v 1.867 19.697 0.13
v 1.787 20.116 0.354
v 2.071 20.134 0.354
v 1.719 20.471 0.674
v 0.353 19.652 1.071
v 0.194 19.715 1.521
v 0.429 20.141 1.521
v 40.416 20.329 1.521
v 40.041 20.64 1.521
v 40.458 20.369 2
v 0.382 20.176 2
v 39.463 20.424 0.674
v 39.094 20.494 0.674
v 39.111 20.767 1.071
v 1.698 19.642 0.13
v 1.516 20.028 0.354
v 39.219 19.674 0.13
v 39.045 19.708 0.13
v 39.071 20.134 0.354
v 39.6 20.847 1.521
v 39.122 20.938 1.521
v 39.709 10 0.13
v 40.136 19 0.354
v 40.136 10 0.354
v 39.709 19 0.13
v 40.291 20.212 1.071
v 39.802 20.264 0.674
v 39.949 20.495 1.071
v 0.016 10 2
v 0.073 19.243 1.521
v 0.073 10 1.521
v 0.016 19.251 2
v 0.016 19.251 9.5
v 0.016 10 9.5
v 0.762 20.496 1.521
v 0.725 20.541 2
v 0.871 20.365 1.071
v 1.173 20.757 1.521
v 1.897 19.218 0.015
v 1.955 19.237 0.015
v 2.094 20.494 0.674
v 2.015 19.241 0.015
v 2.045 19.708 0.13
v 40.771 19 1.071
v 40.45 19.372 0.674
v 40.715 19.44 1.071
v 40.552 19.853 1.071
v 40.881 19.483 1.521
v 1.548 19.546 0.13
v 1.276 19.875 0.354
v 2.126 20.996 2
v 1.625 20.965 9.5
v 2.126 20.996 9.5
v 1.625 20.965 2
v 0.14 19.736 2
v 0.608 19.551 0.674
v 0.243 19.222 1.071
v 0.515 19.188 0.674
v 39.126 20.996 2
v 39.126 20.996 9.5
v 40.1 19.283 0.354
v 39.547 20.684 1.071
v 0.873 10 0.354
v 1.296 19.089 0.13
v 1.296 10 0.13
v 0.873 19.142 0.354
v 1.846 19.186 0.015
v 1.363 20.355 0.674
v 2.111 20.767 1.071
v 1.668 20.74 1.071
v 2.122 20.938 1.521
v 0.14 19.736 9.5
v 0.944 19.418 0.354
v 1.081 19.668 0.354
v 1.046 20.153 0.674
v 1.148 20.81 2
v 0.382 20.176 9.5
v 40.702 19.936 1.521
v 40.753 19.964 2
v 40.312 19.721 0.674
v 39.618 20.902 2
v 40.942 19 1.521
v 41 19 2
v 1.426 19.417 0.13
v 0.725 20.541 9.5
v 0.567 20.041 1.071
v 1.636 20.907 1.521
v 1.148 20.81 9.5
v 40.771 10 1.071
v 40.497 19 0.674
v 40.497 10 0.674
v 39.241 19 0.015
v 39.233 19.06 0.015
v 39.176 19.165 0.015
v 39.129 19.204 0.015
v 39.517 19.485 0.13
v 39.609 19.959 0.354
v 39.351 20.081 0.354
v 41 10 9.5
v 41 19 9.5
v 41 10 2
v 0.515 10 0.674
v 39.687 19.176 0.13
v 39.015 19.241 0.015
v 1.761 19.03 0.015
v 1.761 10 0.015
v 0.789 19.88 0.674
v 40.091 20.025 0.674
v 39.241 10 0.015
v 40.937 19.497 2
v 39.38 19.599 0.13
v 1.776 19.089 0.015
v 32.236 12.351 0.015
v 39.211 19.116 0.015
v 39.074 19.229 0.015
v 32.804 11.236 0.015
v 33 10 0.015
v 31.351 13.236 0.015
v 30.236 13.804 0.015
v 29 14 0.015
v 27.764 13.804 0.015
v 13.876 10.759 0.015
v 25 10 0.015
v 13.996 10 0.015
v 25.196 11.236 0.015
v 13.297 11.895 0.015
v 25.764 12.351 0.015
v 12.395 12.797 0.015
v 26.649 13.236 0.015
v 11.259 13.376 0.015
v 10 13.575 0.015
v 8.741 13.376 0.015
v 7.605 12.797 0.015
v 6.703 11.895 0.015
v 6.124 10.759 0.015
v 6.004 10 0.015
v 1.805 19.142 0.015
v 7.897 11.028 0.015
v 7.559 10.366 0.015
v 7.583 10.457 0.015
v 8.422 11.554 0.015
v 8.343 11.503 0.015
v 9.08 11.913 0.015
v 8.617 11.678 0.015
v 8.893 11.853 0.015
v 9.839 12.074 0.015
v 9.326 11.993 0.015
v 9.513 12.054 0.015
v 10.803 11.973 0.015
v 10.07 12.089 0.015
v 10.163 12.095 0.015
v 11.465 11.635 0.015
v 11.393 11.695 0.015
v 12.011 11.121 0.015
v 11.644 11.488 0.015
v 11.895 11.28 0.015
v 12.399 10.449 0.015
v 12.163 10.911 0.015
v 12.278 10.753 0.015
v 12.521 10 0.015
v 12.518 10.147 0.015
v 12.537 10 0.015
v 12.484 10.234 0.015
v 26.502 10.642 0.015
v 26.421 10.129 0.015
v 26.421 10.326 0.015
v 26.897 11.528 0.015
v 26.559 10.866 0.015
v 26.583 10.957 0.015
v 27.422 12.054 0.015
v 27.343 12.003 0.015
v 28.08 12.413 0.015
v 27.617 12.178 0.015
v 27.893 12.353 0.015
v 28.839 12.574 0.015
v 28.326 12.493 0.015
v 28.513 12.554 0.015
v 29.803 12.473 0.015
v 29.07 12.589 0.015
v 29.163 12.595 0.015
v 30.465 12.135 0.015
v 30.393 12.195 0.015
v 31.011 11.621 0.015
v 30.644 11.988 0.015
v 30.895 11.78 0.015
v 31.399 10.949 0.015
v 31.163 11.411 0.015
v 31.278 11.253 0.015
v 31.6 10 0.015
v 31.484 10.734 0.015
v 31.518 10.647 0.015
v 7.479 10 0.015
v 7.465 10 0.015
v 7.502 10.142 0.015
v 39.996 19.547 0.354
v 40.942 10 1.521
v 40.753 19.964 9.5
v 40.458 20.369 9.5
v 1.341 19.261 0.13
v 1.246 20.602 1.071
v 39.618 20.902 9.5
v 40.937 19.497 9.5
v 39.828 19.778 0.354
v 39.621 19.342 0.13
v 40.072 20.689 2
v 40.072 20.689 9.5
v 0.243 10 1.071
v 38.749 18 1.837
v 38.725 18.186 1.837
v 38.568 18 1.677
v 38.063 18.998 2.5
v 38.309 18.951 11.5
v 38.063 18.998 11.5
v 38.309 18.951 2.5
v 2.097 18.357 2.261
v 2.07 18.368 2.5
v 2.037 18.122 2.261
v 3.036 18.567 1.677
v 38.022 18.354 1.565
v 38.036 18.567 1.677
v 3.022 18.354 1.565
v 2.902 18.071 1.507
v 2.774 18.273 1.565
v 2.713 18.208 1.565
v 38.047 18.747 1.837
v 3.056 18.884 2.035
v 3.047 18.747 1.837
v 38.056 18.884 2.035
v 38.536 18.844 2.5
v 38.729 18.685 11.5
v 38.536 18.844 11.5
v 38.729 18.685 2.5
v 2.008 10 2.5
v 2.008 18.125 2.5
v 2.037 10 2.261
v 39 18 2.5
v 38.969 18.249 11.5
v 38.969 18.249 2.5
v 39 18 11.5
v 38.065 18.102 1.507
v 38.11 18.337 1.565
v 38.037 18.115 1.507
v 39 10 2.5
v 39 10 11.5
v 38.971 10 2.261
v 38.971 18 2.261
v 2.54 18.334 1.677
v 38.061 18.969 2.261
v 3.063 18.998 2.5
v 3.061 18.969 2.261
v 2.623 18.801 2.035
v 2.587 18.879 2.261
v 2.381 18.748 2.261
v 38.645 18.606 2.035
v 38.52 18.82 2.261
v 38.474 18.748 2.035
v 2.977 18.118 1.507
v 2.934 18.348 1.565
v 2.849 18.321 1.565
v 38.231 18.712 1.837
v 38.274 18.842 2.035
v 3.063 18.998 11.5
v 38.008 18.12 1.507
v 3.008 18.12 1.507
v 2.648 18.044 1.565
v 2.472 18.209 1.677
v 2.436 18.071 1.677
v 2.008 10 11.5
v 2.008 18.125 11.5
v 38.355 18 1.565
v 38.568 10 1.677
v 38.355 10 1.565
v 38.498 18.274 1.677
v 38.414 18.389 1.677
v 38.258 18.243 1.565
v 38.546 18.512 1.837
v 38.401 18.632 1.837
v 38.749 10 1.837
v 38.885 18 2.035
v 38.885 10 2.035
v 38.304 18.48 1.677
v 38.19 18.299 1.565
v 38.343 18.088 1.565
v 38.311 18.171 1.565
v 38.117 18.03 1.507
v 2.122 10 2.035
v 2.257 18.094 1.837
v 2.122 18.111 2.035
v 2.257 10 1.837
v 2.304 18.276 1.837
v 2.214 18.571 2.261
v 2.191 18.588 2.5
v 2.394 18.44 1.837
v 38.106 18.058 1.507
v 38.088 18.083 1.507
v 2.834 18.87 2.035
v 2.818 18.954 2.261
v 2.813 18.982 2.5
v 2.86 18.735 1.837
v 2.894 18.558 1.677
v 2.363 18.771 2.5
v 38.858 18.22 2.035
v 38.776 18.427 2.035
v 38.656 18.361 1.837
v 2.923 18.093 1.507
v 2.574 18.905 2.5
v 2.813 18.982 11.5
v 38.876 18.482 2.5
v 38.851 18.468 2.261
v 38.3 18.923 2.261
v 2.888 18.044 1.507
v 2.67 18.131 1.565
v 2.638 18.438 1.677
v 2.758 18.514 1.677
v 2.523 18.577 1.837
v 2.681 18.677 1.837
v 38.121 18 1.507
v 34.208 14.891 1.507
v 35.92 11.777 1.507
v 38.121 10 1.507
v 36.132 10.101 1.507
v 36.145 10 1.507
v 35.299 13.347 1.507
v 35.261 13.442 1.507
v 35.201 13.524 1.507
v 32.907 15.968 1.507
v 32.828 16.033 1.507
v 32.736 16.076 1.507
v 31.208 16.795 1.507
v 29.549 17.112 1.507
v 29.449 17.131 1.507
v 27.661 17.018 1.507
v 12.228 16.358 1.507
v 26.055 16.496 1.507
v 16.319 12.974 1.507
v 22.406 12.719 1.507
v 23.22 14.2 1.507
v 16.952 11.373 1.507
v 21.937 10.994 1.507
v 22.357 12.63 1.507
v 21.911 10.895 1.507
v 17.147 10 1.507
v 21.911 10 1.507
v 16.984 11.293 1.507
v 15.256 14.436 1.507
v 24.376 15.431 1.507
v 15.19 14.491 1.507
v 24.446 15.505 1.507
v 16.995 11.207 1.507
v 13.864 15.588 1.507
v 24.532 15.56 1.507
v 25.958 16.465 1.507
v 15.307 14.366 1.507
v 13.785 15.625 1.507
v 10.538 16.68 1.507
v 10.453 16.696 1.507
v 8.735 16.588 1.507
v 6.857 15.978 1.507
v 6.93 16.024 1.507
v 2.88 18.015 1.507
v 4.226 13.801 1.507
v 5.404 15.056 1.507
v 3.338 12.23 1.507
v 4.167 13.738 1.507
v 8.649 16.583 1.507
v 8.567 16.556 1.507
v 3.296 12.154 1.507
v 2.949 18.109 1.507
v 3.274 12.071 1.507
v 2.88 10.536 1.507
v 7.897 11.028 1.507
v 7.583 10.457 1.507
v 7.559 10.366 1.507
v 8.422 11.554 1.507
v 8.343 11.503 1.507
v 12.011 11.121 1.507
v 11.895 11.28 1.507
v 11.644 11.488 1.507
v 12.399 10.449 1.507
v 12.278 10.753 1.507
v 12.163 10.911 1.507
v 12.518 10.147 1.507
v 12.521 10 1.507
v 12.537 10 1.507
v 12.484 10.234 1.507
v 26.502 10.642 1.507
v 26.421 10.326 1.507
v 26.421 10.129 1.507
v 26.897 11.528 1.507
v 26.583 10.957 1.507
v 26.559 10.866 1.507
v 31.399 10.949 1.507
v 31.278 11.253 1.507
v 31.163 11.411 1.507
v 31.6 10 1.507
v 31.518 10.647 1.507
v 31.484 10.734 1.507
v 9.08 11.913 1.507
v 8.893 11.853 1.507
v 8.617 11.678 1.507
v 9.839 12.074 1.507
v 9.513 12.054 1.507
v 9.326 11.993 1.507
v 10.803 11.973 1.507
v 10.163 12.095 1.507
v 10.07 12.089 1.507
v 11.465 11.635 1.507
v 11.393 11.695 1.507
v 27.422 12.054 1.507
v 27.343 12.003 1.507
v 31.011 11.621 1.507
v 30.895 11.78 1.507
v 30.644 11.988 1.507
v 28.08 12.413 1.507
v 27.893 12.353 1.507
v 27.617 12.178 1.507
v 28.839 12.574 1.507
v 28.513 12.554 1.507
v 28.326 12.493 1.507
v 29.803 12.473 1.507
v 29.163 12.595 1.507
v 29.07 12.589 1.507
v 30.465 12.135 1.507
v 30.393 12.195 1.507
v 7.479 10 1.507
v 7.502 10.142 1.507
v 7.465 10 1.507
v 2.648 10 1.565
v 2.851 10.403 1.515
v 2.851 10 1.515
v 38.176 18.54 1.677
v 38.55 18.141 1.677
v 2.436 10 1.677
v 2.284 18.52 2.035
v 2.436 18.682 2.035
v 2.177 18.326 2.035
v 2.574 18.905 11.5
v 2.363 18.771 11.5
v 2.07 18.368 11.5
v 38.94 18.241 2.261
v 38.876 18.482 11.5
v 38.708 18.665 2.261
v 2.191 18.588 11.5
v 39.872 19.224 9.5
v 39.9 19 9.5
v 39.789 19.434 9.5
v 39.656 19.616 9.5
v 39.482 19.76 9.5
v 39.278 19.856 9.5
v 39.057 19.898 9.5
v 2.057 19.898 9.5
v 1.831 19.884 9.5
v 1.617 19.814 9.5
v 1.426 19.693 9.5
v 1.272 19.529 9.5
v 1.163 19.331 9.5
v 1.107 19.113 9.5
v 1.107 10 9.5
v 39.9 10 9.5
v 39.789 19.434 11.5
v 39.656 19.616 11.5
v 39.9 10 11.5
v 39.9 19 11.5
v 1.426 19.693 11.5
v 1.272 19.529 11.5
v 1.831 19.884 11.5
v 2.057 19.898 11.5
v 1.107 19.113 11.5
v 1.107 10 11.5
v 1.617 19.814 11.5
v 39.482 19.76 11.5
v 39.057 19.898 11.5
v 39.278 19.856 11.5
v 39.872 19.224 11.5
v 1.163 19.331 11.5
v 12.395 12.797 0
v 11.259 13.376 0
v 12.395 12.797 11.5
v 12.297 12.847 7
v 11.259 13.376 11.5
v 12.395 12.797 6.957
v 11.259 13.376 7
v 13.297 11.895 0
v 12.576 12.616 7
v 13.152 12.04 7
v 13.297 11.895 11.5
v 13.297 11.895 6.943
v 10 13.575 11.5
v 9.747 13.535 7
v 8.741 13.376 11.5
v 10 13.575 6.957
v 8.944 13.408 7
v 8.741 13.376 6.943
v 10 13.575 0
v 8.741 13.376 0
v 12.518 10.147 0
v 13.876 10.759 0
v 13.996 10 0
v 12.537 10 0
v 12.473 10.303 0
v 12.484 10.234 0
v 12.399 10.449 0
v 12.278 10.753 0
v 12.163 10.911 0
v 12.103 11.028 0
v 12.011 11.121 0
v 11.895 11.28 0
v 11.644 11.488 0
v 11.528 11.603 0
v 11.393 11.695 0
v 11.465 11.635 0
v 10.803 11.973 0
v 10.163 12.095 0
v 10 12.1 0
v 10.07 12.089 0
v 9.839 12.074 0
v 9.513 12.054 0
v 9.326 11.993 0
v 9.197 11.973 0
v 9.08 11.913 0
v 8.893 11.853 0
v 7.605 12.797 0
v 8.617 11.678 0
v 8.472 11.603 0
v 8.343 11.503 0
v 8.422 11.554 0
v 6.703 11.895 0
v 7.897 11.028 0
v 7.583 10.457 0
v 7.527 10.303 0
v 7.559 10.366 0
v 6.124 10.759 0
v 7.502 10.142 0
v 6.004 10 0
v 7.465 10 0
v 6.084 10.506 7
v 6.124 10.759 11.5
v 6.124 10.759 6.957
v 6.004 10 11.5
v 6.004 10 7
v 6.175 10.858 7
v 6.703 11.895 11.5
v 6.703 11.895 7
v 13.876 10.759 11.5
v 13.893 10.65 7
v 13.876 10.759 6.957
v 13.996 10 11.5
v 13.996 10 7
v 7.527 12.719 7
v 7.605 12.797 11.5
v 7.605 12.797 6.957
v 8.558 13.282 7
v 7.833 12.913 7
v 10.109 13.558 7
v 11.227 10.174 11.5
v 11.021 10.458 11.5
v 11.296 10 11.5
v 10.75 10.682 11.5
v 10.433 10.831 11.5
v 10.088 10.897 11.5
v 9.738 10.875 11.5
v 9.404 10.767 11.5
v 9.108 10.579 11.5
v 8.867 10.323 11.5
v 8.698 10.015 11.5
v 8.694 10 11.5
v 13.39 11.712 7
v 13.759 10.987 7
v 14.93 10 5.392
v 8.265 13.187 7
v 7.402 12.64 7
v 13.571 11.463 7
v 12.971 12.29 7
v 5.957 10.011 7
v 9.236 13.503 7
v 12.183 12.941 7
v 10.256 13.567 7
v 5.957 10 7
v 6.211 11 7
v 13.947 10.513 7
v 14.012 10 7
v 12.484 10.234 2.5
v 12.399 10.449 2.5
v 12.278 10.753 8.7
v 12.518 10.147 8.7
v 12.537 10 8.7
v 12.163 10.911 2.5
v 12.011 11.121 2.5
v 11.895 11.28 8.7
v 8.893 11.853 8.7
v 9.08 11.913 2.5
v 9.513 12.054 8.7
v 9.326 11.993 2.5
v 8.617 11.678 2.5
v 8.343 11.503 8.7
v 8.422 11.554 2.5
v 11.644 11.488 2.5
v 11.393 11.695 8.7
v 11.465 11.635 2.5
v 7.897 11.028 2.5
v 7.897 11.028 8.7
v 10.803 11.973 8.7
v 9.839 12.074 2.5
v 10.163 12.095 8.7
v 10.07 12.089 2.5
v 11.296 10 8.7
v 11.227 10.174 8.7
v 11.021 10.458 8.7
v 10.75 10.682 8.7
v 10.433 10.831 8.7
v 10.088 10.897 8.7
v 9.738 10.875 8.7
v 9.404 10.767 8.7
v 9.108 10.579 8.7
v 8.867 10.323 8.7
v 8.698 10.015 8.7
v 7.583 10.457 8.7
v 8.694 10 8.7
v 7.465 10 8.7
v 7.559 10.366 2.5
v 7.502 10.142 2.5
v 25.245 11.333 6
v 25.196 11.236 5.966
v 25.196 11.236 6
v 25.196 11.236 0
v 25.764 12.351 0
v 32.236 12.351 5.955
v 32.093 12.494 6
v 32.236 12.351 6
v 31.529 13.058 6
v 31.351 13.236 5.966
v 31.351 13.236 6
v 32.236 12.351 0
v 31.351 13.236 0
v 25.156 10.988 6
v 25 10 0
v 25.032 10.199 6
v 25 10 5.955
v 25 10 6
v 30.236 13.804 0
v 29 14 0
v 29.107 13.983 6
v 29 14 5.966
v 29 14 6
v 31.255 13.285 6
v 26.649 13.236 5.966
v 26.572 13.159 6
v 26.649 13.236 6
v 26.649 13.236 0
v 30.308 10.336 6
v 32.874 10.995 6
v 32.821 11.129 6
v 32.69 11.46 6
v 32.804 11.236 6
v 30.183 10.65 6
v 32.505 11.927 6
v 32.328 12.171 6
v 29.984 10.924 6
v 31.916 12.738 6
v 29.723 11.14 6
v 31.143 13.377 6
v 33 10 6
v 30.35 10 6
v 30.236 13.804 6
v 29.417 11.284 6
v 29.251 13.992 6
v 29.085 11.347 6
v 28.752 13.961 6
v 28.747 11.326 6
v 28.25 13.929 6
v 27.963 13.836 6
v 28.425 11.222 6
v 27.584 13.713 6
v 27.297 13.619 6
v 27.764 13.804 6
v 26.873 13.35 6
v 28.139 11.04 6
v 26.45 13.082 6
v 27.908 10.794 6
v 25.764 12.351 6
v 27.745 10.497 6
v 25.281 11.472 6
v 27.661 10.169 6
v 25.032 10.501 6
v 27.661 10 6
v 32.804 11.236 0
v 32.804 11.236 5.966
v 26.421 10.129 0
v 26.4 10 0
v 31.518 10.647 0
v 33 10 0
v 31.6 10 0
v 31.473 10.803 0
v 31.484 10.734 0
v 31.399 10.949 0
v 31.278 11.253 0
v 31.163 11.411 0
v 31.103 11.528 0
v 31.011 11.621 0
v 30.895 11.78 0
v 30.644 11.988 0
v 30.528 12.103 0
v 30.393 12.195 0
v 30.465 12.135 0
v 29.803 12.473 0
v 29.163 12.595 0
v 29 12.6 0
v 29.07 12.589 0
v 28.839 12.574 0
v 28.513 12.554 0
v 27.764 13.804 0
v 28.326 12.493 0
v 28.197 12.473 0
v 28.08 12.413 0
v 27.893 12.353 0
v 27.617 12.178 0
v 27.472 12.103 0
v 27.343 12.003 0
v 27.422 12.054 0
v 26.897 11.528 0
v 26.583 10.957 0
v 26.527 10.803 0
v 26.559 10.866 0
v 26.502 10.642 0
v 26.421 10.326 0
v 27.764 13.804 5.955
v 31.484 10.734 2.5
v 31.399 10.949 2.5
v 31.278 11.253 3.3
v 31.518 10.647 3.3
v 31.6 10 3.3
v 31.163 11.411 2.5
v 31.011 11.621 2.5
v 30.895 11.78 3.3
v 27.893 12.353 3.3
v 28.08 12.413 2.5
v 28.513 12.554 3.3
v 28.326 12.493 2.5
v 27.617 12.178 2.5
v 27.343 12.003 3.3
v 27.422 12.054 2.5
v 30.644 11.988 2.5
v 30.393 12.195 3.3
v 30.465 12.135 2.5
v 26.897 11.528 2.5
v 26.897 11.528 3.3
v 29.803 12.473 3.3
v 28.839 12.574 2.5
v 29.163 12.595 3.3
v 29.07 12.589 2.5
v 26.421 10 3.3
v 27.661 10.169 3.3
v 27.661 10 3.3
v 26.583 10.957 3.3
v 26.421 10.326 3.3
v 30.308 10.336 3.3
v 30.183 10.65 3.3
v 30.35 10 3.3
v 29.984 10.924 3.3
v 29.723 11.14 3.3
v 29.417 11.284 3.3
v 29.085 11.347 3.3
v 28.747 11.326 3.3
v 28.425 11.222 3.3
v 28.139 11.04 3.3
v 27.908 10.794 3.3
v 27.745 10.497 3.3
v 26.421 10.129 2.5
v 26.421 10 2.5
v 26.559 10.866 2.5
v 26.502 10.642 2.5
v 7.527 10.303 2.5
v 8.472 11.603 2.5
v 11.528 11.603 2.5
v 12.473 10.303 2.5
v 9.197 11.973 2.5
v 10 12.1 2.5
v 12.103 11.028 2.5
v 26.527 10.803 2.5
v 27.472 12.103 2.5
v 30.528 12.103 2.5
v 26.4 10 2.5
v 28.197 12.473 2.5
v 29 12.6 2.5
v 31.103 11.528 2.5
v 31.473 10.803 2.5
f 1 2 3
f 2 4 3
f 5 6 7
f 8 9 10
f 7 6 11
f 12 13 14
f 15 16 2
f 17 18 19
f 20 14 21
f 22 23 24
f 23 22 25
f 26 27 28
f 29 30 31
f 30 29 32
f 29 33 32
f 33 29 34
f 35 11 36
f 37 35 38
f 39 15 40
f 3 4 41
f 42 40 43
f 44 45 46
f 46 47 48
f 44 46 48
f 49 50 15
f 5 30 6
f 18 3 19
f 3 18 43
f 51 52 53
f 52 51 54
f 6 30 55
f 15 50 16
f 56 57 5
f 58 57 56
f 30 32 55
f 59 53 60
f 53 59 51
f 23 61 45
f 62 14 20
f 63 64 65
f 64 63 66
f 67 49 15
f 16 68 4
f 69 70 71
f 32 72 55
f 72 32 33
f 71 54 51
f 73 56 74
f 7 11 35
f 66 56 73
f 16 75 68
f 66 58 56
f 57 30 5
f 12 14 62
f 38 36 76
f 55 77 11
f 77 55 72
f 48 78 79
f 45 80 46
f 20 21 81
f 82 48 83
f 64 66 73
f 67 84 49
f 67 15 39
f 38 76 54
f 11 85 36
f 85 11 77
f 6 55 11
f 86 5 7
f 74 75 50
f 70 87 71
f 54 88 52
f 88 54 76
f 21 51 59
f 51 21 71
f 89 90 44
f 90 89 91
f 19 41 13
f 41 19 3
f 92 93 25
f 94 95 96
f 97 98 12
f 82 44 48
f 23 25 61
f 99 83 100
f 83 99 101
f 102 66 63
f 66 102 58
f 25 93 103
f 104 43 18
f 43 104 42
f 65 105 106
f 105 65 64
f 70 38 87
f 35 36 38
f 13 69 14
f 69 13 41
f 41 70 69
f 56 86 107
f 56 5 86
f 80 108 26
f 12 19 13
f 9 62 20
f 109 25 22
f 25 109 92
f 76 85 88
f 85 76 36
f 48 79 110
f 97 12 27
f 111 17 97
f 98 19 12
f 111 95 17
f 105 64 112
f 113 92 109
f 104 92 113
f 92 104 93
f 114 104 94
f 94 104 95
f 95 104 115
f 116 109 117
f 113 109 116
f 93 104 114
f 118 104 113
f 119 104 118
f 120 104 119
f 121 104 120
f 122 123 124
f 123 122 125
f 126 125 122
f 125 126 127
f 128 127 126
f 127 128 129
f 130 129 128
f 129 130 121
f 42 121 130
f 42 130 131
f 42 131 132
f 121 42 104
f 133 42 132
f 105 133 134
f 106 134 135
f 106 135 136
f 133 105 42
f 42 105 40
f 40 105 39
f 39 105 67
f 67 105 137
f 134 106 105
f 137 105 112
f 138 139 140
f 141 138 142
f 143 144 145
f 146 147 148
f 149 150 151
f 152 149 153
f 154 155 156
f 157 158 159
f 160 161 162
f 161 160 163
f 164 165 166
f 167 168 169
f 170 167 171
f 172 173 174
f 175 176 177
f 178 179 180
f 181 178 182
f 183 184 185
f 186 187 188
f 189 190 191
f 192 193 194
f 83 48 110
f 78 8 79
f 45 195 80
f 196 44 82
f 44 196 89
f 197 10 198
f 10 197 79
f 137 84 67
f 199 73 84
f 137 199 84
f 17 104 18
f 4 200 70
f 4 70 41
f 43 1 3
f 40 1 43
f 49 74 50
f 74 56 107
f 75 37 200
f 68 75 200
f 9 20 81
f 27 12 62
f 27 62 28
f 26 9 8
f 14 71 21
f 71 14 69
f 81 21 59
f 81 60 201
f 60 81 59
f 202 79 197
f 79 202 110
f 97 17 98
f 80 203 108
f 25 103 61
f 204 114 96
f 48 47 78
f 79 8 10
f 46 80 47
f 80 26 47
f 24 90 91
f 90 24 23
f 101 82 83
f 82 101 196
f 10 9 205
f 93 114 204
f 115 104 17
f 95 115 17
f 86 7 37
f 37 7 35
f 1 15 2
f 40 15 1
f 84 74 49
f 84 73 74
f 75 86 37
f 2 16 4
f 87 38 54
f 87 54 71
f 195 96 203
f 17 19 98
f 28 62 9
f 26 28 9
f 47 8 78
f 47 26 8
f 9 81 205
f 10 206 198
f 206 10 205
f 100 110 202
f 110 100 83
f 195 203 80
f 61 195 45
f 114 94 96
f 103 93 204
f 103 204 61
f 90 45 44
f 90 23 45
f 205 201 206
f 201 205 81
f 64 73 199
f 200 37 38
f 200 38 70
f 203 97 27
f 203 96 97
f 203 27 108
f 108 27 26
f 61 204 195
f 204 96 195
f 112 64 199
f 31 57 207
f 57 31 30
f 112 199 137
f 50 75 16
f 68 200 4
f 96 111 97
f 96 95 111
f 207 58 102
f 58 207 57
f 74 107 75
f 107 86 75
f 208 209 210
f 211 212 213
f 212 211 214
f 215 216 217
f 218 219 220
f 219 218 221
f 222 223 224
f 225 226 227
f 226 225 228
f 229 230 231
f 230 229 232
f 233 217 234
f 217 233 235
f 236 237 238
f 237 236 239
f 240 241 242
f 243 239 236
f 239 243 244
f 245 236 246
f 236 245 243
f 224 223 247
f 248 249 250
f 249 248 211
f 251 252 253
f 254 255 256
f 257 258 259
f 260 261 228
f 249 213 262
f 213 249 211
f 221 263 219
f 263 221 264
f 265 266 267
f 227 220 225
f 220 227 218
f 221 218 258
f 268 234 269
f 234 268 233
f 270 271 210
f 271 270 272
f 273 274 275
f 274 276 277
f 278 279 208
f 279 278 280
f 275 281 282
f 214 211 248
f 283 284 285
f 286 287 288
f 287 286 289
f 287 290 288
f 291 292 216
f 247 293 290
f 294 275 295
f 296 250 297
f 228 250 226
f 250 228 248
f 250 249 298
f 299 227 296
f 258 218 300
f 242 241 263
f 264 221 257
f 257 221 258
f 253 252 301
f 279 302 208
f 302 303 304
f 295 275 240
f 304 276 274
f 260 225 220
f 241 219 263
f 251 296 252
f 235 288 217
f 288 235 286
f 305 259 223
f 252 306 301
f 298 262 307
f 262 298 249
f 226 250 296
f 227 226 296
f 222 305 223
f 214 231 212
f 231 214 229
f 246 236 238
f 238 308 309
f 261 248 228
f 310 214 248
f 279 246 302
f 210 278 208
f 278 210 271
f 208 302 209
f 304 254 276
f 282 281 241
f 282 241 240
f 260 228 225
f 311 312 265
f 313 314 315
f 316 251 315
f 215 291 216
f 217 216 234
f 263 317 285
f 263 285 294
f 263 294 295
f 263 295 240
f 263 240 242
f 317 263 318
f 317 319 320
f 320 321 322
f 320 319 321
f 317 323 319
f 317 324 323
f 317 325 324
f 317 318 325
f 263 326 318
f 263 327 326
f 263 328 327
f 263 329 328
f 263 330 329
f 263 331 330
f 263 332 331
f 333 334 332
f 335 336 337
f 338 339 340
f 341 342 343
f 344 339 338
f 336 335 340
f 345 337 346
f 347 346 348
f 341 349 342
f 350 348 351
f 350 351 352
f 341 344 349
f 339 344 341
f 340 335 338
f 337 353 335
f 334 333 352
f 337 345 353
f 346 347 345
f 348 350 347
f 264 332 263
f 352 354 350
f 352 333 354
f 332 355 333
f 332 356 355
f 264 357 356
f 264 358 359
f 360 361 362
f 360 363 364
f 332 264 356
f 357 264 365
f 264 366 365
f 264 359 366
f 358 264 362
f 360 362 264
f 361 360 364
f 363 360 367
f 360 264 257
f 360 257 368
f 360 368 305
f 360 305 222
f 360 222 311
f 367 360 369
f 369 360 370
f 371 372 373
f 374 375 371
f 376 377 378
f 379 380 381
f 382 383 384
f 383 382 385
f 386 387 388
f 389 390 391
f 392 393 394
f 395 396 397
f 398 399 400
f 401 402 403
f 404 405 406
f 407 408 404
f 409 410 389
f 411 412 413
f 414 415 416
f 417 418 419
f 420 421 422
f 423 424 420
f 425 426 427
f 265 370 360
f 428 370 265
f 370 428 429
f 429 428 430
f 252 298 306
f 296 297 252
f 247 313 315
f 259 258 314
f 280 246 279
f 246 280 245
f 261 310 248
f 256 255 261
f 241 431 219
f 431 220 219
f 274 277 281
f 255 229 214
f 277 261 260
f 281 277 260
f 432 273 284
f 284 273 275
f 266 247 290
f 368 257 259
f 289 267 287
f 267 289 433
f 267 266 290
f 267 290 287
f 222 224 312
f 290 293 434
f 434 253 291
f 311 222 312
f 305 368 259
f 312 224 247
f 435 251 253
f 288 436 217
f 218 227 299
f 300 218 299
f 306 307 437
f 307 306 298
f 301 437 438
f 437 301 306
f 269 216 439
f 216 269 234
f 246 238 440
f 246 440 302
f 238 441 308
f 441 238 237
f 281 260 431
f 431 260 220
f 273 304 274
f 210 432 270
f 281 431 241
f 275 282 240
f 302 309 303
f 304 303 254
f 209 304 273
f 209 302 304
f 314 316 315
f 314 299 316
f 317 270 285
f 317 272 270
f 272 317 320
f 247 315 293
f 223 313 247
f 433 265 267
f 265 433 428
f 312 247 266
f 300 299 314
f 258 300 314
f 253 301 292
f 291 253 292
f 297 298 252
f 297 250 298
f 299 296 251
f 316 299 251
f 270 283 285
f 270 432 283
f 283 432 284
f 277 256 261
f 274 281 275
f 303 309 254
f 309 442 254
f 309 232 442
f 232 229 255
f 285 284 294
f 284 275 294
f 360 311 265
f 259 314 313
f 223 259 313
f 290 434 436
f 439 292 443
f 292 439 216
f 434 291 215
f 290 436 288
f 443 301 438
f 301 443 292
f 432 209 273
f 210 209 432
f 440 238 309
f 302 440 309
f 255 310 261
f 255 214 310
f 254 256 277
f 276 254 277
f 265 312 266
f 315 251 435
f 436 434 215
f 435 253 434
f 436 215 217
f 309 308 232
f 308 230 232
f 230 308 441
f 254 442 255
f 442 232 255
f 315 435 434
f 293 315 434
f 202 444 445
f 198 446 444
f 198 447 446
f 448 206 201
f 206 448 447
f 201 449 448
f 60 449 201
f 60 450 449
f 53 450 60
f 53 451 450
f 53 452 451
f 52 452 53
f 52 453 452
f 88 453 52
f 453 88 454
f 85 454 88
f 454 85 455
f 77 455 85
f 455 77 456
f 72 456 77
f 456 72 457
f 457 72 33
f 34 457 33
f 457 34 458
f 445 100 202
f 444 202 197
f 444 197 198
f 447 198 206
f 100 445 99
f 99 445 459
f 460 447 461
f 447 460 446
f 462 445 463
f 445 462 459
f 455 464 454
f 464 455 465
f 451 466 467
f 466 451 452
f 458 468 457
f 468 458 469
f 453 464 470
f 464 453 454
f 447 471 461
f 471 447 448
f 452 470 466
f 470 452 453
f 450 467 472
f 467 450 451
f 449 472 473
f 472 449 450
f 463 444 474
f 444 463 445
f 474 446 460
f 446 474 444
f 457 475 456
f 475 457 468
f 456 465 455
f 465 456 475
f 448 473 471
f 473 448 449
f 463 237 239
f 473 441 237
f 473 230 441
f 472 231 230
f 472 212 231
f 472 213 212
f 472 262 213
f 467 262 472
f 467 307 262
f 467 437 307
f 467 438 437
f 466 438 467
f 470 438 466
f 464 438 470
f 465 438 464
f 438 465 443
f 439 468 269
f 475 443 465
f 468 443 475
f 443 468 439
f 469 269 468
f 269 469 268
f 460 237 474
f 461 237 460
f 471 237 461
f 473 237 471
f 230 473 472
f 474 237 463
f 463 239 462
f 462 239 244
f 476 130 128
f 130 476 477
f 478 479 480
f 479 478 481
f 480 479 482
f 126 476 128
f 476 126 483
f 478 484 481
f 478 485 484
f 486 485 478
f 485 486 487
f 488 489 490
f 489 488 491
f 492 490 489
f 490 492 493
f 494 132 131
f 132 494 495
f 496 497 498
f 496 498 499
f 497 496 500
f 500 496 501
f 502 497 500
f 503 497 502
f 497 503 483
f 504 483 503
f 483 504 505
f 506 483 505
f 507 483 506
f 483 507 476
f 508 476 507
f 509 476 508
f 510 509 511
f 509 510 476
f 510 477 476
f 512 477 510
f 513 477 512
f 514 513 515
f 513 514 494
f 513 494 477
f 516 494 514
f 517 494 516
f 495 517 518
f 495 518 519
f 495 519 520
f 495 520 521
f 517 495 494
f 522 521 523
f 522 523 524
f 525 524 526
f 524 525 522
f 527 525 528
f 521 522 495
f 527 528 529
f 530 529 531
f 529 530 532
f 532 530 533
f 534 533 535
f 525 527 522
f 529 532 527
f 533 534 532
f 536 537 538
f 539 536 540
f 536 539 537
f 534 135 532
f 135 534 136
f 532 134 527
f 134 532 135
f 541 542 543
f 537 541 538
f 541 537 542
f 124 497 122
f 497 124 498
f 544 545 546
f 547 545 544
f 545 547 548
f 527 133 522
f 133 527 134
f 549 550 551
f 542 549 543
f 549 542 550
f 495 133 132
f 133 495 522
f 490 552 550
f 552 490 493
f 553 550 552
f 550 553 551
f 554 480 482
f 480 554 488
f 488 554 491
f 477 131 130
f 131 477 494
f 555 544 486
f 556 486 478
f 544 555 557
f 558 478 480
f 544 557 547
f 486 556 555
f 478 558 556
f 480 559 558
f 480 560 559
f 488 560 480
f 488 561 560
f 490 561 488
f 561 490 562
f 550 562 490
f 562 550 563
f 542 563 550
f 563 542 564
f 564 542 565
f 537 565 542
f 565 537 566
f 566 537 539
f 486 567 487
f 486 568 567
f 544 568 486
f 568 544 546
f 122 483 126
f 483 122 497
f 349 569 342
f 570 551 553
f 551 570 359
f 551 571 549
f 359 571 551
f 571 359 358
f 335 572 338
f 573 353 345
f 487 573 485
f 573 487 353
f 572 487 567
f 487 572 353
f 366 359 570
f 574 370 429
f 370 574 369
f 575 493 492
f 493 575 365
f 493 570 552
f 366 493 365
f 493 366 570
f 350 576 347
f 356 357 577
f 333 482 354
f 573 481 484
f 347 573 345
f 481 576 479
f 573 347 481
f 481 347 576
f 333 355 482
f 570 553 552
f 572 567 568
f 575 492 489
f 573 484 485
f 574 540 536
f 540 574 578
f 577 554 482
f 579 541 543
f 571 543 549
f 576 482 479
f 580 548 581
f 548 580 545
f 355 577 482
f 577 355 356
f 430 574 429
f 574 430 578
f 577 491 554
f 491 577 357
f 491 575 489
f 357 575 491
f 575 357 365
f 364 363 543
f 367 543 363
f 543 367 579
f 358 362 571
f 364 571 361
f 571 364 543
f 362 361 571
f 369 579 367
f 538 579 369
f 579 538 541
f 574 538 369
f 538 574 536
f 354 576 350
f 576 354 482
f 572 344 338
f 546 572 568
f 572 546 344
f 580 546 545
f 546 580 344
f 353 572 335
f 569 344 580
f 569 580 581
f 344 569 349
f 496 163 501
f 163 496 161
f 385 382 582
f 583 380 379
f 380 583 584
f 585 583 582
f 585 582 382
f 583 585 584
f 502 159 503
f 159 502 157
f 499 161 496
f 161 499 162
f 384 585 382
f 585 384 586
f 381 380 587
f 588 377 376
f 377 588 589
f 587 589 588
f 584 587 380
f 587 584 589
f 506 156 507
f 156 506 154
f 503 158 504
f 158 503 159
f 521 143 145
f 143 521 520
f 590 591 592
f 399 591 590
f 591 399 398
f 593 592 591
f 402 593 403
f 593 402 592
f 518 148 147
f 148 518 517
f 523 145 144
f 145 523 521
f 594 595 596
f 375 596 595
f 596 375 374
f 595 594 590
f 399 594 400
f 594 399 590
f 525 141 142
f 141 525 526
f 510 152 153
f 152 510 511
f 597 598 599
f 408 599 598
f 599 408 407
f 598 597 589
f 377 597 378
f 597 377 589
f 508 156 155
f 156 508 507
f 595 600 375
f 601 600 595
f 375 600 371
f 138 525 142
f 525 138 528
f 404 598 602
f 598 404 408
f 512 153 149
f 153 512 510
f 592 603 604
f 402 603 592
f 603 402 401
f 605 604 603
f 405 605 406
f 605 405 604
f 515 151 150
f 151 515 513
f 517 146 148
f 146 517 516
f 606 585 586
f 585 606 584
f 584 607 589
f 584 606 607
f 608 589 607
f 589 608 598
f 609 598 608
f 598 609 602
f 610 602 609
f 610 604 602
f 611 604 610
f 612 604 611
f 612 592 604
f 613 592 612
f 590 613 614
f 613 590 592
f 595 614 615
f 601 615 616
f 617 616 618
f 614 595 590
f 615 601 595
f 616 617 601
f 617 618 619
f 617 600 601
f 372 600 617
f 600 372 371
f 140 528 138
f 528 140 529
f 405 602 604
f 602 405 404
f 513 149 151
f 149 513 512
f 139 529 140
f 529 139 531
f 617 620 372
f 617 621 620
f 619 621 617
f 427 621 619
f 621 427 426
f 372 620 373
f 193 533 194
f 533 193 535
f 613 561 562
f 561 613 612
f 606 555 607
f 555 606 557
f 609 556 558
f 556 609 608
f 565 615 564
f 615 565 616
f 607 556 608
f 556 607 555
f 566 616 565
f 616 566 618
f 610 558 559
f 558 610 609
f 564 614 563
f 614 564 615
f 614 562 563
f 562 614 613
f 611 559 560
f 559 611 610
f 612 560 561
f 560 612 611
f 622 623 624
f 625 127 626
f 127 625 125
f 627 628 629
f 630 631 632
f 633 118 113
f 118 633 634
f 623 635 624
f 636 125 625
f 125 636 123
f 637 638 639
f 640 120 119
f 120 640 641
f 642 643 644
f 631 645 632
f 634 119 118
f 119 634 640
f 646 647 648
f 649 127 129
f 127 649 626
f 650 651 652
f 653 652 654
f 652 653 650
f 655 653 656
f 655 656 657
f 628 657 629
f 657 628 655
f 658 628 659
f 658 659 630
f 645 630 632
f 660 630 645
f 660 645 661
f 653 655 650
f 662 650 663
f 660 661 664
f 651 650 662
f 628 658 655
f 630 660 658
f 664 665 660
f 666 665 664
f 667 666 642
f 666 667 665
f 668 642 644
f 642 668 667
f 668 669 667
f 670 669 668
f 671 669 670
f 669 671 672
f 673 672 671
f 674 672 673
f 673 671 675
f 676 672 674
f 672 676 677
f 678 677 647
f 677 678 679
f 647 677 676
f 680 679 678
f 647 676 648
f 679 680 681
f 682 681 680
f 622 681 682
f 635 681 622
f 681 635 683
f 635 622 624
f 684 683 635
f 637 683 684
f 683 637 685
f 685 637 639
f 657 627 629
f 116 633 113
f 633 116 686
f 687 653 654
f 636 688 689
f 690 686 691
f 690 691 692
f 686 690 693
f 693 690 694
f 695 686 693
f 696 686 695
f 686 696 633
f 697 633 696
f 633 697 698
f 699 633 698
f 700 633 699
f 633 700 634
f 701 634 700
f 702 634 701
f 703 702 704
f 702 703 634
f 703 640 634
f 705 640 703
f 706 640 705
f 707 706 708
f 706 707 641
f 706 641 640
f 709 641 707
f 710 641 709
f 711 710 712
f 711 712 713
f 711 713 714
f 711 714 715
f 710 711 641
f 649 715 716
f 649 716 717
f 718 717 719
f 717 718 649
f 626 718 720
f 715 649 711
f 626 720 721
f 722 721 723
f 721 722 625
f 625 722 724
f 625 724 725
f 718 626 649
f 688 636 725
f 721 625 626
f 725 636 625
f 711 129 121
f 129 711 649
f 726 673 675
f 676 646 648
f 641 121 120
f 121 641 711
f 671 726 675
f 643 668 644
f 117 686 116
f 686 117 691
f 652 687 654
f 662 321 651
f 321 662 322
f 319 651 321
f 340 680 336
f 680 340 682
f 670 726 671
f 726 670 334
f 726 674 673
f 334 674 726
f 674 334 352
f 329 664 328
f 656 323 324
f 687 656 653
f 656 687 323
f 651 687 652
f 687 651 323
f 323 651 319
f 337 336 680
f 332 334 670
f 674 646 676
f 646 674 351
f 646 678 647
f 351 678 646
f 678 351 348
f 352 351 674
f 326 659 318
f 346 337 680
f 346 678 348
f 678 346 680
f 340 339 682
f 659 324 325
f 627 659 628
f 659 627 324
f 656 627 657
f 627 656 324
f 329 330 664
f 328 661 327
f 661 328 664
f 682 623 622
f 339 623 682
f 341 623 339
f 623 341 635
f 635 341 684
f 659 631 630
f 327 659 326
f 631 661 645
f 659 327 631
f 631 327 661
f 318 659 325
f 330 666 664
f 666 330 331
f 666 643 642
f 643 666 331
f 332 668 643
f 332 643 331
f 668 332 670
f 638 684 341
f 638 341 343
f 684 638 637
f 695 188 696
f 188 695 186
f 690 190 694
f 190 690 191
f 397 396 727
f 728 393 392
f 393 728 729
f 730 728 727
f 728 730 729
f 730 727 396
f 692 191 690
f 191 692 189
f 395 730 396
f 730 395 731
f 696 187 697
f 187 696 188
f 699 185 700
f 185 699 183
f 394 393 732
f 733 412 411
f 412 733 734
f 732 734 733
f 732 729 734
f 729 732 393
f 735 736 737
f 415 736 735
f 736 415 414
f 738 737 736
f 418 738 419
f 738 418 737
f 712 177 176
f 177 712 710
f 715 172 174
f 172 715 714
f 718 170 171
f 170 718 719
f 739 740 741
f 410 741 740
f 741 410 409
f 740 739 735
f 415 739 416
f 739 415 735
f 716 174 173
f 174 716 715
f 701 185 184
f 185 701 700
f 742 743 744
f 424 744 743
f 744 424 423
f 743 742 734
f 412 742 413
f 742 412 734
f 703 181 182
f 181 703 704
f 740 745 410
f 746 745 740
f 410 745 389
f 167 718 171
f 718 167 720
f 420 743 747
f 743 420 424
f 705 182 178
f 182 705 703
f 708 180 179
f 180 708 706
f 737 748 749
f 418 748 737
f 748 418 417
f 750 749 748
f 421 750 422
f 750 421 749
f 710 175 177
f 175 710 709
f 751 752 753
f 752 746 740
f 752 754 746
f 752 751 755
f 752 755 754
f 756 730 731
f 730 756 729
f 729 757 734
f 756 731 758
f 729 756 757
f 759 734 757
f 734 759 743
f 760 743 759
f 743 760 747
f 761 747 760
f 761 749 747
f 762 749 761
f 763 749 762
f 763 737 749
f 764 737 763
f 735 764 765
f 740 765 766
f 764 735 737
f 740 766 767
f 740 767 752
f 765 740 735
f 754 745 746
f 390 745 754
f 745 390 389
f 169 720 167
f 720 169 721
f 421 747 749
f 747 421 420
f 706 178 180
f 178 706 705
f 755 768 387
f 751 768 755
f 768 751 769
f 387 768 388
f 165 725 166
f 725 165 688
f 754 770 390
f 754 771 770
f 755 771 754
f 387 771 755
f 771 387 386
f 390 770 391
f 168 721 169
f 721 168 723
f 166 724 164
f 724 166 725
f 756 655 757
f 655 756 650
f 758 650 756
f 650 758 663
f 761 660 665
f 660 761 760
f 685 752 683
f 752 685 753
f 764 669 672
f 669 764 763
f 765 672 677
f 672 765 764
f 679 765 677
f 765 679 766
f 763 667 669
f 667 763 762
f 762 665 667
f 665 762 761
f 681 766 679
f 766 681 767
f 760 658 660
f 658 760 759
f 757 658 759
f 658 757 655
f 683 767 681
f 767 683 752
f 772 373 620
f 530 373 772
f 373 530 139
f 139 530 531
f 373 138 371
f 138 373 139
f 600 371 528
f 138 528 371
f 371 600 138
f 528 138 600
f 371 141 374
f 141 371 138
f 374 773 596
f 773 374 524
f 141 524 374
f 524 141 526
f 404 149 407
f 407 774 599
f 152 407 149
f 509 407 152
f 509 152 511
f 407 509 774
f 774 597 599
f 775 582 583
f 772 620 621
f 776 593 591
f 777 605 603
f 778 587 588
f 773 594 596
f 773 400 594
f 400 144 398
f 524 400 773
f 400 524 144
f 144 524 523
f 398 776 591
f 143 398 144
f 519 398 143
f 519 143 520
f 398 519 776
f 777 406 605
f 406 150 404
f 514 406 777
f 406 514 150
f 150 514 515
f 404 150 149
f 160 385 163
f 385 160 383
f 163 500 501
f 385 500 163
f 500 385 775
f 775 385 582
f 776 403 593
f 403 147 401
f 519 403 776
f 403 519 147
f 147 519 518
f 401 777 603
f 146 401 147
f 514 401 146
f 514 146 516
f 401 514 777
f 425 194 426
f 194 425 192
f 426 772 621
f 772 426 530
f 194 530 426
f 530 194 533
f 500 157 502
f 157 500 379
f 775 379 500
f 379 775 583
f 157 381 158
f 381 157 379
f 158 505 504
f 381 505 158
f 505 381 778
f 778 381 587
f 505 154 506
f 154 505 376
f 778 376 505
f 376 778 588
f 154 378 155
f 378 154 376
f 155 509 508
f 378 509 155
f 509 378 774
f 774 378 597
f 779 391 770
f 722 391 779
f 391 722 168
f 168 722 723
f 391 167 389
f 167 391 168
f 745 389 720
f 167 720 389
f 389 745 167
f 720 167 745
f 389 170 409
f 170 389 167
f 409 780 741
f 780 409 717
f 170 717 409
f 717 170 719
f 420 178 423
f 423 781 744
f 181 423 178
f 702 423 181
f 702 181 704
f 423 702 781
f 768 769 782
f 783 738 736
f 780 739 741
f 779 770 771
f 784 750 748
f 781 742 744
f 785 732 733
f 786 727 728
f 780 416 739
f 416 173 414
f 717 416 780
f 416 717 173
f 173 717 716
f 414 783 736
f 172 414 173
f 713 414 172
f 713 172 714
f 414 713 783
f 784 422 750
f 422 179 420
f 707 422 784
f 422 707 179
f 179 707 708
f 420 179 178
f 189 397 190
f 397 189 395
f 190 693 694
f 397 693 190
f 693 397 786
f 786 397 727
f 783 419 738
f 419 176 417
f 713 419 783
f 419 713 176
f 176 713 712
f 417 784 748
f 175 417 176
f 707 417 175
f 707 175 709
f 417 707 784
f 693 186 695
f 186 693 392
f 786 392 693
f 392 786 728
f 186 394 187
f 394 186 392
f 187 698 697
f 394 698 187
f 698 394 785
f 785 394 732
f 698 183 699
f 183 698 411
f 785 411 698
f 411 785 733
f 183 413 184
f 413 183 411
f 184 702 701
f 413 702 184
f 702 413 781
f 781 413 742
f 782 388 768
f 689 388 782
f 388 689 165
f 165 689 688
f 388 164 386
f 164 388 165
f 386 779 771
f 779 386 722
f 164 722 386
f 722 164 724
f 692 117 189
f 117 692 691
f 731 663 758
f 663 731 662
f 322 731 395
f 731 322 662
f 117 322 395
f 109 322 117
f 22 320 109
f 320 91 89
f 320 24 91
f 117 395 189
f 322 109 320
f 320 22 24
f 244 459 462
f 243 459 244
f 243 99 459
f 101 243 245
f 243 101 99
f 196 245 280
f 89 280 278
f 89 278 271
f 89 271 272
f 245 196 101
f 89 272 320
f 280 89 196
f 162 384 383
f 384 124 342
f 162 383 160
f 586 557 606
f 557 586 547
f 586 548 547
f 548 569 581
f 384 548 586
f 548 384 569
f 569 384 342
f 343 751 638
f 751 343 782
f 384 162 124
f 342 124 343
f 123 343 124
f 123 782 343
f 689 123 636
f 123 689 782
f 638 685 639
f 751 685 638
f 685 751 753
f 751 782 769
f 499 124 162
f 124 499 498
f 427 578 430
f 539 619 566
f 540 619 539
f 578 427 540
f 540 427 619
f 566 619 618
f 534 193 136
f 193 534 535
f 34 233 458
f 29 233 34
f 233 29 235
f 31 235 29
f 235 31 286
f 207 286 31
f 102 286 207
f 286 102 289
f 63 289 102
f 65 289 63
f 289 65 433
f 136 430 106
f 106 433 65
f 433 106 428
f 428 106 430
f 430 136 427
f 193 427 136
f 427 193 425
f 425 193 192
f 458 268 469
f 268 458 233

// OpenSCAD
//-----------------------------------------------------------------------
// Yet Another Parameterized Projectbox generator
//
//  This is a YAPP_StandSmall_v17 test box
//
//  Version 1.7 (28-01-2023)
//
// This design is parameterized based on the size of a PCB.
//
//  for many or complex cutoutGrills you might need to adjust
//  the number of elements:
//
//      Preferences->Advanced->Turn of rendering at 100000 elements
//                                                  ^^^^^^
//
//-----------------------------------------------------------------------

insertDiam  = 4.0;
screwDiam   = 2.5;
headDiam    = 5.0;
insertDiam2 = insertDiam + 0.2;
screwDiam2  = screwDiam + 0.2;
headDiam2   = headDiam + 0.2;
insertDiam3 = insertDiam + 0.3;
screwDiam3  = screwDiam + 0.3;
headDiam3   = headDiam + 0.2;



include <./library/YAPPgenerator_v19.scad>

// Note: length/lengte refers to X axis, 
//       width/breedte to Y, 
//       height/hoogte to Z

/*
            padding-back>|<---- pcb length ---->|<padding-front
                                 RIGHT
                   0    X-ax ---> 
               +----------------------------------------+   ---
               |                                        |    ^
               |                                        |   padding-right 
             ^ |                                        |    v
             | |    -5,y +----------------------+       |   ---              
        B    Y |         | 0,y              x,y |       |     ^              F
        A    - |         |                      |       |     |              R
        C    a |         |                      |       |     | pcb width    O
        K    x |         |                      |       |     |              N
               |         | 0,0              x,0 |       |     v              T
               |   -5,0  +----------------------+       |   ---
               |                                        |    padding-left
             0 +----------------------------------------+   ---
               0    X-ax --->
                                 LEFT
*/

printBaseShell      = true;
printLidShell       = false;

// Edit these parameters for your own board dimensions
wallThickness       = 2.0;
basePlaneThickness  = 1.5;
lidPlaneThickness   = 1.5;

baseWallHeight      = 10;
lidWallHeight       = 16;

// ridge where base and lid off box can overlap
// Make sure this isn't less than lidWallHeight
ridgeHeight         = 2;
ridgeSlack          = 0.2;
roundRadius         = 2.0;

// How much the PCB needs to be raised from the base
// to leave room for solderings and whatnot
standoffHeight      = 4.5;
pinDiameter         = 2.5;
pinHoleSlack        = 0.3;
standoffDiameter    = 9;

// Total height of box = basePlaneThickness + lidPlaneThickness 
//                     + baseWallHeight + lidWallHeight
pcbLength           = 35;
pcbWidth            = 15;
pcbThickness        = 1.5;
                            
// padding between pcb and inside wall
paddingFront        = 1;
paddingBack         = 1;
paddingRight        = 1;
paddingLeft         = 1;


//-- D E B U G -----------------//-> Default ---------
showSideBySide      = true;     //-> true
onLidGap            = 3;
shiftLid            = 1;
hideLidWalls        = false;    //-> false
colorLid            = "yellow";   
hideBaseWalls       = false;    //-> false
colorBase           = "white";
showOrientation     = false;
showPCB             = true;
showPCBmarkers      = false;
showShellZero       = false;
showCenterMarkers   = false;
inspectX            = 0;        //-> 0=none (>0 from front, <0 from back)
inspectY            = 10;        //-> 0=none (>0 from left, <0 from right)
//-- D E B U G ---------------------------------------

//-- pcb_standoffs  -- origin is pcb[0,0,0]
// (0) = posx
// (1) = posy
// (2) = { yappBoth | yappLidOnly | yappBaseOnly }
// (3) = { yappHole, YappPin }
pcbStands = [
             //   [10, pcbWidth/2, yappBoth, yappPin] 
             //  ,[35, pcbWidth/2, yappBoth, yappHole]
            ];     

//-- Lid plane    -- origin is pcb[0,0,0]
// (0) = posx
// (1) = posy
// (2) = width
// (3) = length
// (4) = angle
// (5) = { yappRectangle | yappCircle }
// (6) = { yappCenter }
cutoutsLid =  [
               //     [20, 20, 10, 20, 10, yappRectangle]  
               //   , [20, 50, 10, 20, 0, yappRectangle, yappCenter]
               //   , [50, 50, 10, 2, 0, yappCircle]
               //   , [pcbLength-10, 20, 15, 0, 0, yappCircle] 
               //   , [50, pcbWidth, 5, 7, 0, yappRectangle, yappCenter]
              ];

//-- base plane    -- origin is pcb[0,0,0]
// (0) = posx
// (1) = posy
// (2) = width
// (3) = length
// (4) = angle
// (5) = { yappRectangle | yappCircle }
// (6) = { yappCenter }
cutoutsBase =   [
                 //   [10, 10, 20, 10, 45, yappRectangle]
                 // , [30, 10, 15, 10, 45, yappRectangle, yappCenter]
                 // , [20, pcbWidth-20, 15, 0, 0, yappCircle]
                 // , [pcbLength-15, 5, 10, 2, 0, yappCircle]
                ];

//-- front plane  -- origin is pcb[0,0,0]
// (0) = posy
// (1) = posz
// (2) = width
// (3) = height
// (4) = angle
// (5) = { yappRectangle | yappCircle }
// (6) = { yappCenter }
cutoutsFront =  [
                ];

//-- back plane  -- origin is pcb[0,0,0]
// (0) = posy
// (1) = posz
// (2) = width
// (3) = height
// (4) = angle
// (5) = { yappRectangle | yappCircle }
// (6) = { yappCenter }
cutoutsBack =   [
                ];

//-- left plane   -- origin is pcb[0,0,0]
// (0) = posx
// (1) = posz
// (2) = width
// (3) = height
// (4) = angle
// (5) = { yappRectangle | yappCircle }
// (6) = { yappCenter }
cutoutsLeft =   [
                ];

//-- right plane   -- origin is pcb[0,0,0]
// (0) = posx
// (1) = posz
// (2) = width
// (3) = height
// (4) = angle
// (5) = { yappRectangle | yappCircle }
// (6) = { yappCenter }
cutoutsRight =  [
                ];

//-- cutoutGrills    -- origin is pcb[x0,y0, zx]
// (0) = xPos
// (1) = yPos
// (2) = grillWidth
// (3) = grillLength
// (4) = gWidth
// (5) = gSpace
// (6) = gAngle
// (7) = plane {"base" | "lid" }
// (8) = {polygon points}}

cutoutsGrill = [
               ];

//-- connectors 
//-- yappConnShells : origen = box[0,0,0]
//-- yappConnWithPCB: origen = pcb[0,0,0]
// (0) = posx
// (1) = posy
// (2) = standHeight
// (3) = screwDiameter
// (4) = screwHeadDiameter
// (5) = insertDiameter
// (6) = outsideDiameter
// (7) = flangeHeight
// (8) = flangeDiam
// (9) = { yappConnWithPCB }
// (10) = { yappAllCorners | yappFrontLeft | yappFrontRight | yappBackLeft | yappBackRight }
connectors   =  [
                   [10, 9.5, 0, screwDiam3, headDiam3, insertDiam3, 7, 6, 15]
                 , [26, 7, 4.5, screwDiam2, headDiam2, insertDiam2, 4, 14, 15
                                          , yappConnWithPCB]

                ];


//-- base mounts -- origen = box[x0,y0]
// (0) = posx | posy
// (1) = screwDiameter
// (2) = width
// (3) = height
// (4..7) = yappLeft / yappRight / yappFront / yappBack (one or more)
// (5) = { yappCenter }
baseMounts   = [
               ];
               
//-- snap Joins -- origen = box[x0,y0]
// (0) = posx | posy
// (1) = width
// (2..5) = yappLeft / yappRight / yappFront / yappBack (one or more)
// (n) = { yappSymmetric }
snapJoins   =     [
              //    [2, 10, yappLeft, yappRight, yappSymmetric]
              //    [5, 10, yappLeft]
              //  , [shellLength-2, 10, yappLeft]
              //  , [30,  10, yappFront, yappBack]
              //  , [2.5, 3, 5, yappBack, yappFront, yappSymmetric]
                ];
               
//-- origin of labels is box [0,0,0]
// (0) = posx
// (1) = posy/z
// (2) = orientation
// (3) = plane {lid | base | left | right | front | back }
// (4) = font
// (5) = size
// (6) = "label text"
labelsPlane =  [
               //     [10,  10,   0, 1, "lid",   "Liberation Mono:style=bold", 7, "YAPP" ]
               //   , [100, 90, 180, 1, "base",  "Liberation Mono:style=bold", 7, "Base" ]
               //   , [8,    8,   0, 1, "left",  "Liberation Mono:style=bold", 7, "Left" ]
               //   , [10,   5,   0, 1, "right", "Liberation Mono:style=bold", 7, "Right" ]
               //   , [40,  23,   0, 1, "front", "Liberation Mono:style=bold", 7, "Front" ]
               //   , [5,    5,   0, 1, "back",  "Liberation Mono:style=bold", 7, "Back" ]
               ];


//========= MAIN CALL's ===========================================================
  
//===========================================================
module lidHookInside()
{
  //echo("lidHookInside(original) ..");
  
} // lidHookInside(dummy)
  
//===========================================================
module lidHookOutside()
{
  //echo("lidHookOutside(original) ..");
  
} // lidHookOutside(dummy)

//===========================================================
module baseHookInside()
{
  //echo("baseHookInside(original) ..");
  
} // baseHookInside(dummy)

//===========================================================
module baseHookOutside()
{
  //echo("baseHookOutside(original) ..");
  
} // baseHookOutside(dummy)




//---- This is where the magic happens ----
YAPPgenerate();
